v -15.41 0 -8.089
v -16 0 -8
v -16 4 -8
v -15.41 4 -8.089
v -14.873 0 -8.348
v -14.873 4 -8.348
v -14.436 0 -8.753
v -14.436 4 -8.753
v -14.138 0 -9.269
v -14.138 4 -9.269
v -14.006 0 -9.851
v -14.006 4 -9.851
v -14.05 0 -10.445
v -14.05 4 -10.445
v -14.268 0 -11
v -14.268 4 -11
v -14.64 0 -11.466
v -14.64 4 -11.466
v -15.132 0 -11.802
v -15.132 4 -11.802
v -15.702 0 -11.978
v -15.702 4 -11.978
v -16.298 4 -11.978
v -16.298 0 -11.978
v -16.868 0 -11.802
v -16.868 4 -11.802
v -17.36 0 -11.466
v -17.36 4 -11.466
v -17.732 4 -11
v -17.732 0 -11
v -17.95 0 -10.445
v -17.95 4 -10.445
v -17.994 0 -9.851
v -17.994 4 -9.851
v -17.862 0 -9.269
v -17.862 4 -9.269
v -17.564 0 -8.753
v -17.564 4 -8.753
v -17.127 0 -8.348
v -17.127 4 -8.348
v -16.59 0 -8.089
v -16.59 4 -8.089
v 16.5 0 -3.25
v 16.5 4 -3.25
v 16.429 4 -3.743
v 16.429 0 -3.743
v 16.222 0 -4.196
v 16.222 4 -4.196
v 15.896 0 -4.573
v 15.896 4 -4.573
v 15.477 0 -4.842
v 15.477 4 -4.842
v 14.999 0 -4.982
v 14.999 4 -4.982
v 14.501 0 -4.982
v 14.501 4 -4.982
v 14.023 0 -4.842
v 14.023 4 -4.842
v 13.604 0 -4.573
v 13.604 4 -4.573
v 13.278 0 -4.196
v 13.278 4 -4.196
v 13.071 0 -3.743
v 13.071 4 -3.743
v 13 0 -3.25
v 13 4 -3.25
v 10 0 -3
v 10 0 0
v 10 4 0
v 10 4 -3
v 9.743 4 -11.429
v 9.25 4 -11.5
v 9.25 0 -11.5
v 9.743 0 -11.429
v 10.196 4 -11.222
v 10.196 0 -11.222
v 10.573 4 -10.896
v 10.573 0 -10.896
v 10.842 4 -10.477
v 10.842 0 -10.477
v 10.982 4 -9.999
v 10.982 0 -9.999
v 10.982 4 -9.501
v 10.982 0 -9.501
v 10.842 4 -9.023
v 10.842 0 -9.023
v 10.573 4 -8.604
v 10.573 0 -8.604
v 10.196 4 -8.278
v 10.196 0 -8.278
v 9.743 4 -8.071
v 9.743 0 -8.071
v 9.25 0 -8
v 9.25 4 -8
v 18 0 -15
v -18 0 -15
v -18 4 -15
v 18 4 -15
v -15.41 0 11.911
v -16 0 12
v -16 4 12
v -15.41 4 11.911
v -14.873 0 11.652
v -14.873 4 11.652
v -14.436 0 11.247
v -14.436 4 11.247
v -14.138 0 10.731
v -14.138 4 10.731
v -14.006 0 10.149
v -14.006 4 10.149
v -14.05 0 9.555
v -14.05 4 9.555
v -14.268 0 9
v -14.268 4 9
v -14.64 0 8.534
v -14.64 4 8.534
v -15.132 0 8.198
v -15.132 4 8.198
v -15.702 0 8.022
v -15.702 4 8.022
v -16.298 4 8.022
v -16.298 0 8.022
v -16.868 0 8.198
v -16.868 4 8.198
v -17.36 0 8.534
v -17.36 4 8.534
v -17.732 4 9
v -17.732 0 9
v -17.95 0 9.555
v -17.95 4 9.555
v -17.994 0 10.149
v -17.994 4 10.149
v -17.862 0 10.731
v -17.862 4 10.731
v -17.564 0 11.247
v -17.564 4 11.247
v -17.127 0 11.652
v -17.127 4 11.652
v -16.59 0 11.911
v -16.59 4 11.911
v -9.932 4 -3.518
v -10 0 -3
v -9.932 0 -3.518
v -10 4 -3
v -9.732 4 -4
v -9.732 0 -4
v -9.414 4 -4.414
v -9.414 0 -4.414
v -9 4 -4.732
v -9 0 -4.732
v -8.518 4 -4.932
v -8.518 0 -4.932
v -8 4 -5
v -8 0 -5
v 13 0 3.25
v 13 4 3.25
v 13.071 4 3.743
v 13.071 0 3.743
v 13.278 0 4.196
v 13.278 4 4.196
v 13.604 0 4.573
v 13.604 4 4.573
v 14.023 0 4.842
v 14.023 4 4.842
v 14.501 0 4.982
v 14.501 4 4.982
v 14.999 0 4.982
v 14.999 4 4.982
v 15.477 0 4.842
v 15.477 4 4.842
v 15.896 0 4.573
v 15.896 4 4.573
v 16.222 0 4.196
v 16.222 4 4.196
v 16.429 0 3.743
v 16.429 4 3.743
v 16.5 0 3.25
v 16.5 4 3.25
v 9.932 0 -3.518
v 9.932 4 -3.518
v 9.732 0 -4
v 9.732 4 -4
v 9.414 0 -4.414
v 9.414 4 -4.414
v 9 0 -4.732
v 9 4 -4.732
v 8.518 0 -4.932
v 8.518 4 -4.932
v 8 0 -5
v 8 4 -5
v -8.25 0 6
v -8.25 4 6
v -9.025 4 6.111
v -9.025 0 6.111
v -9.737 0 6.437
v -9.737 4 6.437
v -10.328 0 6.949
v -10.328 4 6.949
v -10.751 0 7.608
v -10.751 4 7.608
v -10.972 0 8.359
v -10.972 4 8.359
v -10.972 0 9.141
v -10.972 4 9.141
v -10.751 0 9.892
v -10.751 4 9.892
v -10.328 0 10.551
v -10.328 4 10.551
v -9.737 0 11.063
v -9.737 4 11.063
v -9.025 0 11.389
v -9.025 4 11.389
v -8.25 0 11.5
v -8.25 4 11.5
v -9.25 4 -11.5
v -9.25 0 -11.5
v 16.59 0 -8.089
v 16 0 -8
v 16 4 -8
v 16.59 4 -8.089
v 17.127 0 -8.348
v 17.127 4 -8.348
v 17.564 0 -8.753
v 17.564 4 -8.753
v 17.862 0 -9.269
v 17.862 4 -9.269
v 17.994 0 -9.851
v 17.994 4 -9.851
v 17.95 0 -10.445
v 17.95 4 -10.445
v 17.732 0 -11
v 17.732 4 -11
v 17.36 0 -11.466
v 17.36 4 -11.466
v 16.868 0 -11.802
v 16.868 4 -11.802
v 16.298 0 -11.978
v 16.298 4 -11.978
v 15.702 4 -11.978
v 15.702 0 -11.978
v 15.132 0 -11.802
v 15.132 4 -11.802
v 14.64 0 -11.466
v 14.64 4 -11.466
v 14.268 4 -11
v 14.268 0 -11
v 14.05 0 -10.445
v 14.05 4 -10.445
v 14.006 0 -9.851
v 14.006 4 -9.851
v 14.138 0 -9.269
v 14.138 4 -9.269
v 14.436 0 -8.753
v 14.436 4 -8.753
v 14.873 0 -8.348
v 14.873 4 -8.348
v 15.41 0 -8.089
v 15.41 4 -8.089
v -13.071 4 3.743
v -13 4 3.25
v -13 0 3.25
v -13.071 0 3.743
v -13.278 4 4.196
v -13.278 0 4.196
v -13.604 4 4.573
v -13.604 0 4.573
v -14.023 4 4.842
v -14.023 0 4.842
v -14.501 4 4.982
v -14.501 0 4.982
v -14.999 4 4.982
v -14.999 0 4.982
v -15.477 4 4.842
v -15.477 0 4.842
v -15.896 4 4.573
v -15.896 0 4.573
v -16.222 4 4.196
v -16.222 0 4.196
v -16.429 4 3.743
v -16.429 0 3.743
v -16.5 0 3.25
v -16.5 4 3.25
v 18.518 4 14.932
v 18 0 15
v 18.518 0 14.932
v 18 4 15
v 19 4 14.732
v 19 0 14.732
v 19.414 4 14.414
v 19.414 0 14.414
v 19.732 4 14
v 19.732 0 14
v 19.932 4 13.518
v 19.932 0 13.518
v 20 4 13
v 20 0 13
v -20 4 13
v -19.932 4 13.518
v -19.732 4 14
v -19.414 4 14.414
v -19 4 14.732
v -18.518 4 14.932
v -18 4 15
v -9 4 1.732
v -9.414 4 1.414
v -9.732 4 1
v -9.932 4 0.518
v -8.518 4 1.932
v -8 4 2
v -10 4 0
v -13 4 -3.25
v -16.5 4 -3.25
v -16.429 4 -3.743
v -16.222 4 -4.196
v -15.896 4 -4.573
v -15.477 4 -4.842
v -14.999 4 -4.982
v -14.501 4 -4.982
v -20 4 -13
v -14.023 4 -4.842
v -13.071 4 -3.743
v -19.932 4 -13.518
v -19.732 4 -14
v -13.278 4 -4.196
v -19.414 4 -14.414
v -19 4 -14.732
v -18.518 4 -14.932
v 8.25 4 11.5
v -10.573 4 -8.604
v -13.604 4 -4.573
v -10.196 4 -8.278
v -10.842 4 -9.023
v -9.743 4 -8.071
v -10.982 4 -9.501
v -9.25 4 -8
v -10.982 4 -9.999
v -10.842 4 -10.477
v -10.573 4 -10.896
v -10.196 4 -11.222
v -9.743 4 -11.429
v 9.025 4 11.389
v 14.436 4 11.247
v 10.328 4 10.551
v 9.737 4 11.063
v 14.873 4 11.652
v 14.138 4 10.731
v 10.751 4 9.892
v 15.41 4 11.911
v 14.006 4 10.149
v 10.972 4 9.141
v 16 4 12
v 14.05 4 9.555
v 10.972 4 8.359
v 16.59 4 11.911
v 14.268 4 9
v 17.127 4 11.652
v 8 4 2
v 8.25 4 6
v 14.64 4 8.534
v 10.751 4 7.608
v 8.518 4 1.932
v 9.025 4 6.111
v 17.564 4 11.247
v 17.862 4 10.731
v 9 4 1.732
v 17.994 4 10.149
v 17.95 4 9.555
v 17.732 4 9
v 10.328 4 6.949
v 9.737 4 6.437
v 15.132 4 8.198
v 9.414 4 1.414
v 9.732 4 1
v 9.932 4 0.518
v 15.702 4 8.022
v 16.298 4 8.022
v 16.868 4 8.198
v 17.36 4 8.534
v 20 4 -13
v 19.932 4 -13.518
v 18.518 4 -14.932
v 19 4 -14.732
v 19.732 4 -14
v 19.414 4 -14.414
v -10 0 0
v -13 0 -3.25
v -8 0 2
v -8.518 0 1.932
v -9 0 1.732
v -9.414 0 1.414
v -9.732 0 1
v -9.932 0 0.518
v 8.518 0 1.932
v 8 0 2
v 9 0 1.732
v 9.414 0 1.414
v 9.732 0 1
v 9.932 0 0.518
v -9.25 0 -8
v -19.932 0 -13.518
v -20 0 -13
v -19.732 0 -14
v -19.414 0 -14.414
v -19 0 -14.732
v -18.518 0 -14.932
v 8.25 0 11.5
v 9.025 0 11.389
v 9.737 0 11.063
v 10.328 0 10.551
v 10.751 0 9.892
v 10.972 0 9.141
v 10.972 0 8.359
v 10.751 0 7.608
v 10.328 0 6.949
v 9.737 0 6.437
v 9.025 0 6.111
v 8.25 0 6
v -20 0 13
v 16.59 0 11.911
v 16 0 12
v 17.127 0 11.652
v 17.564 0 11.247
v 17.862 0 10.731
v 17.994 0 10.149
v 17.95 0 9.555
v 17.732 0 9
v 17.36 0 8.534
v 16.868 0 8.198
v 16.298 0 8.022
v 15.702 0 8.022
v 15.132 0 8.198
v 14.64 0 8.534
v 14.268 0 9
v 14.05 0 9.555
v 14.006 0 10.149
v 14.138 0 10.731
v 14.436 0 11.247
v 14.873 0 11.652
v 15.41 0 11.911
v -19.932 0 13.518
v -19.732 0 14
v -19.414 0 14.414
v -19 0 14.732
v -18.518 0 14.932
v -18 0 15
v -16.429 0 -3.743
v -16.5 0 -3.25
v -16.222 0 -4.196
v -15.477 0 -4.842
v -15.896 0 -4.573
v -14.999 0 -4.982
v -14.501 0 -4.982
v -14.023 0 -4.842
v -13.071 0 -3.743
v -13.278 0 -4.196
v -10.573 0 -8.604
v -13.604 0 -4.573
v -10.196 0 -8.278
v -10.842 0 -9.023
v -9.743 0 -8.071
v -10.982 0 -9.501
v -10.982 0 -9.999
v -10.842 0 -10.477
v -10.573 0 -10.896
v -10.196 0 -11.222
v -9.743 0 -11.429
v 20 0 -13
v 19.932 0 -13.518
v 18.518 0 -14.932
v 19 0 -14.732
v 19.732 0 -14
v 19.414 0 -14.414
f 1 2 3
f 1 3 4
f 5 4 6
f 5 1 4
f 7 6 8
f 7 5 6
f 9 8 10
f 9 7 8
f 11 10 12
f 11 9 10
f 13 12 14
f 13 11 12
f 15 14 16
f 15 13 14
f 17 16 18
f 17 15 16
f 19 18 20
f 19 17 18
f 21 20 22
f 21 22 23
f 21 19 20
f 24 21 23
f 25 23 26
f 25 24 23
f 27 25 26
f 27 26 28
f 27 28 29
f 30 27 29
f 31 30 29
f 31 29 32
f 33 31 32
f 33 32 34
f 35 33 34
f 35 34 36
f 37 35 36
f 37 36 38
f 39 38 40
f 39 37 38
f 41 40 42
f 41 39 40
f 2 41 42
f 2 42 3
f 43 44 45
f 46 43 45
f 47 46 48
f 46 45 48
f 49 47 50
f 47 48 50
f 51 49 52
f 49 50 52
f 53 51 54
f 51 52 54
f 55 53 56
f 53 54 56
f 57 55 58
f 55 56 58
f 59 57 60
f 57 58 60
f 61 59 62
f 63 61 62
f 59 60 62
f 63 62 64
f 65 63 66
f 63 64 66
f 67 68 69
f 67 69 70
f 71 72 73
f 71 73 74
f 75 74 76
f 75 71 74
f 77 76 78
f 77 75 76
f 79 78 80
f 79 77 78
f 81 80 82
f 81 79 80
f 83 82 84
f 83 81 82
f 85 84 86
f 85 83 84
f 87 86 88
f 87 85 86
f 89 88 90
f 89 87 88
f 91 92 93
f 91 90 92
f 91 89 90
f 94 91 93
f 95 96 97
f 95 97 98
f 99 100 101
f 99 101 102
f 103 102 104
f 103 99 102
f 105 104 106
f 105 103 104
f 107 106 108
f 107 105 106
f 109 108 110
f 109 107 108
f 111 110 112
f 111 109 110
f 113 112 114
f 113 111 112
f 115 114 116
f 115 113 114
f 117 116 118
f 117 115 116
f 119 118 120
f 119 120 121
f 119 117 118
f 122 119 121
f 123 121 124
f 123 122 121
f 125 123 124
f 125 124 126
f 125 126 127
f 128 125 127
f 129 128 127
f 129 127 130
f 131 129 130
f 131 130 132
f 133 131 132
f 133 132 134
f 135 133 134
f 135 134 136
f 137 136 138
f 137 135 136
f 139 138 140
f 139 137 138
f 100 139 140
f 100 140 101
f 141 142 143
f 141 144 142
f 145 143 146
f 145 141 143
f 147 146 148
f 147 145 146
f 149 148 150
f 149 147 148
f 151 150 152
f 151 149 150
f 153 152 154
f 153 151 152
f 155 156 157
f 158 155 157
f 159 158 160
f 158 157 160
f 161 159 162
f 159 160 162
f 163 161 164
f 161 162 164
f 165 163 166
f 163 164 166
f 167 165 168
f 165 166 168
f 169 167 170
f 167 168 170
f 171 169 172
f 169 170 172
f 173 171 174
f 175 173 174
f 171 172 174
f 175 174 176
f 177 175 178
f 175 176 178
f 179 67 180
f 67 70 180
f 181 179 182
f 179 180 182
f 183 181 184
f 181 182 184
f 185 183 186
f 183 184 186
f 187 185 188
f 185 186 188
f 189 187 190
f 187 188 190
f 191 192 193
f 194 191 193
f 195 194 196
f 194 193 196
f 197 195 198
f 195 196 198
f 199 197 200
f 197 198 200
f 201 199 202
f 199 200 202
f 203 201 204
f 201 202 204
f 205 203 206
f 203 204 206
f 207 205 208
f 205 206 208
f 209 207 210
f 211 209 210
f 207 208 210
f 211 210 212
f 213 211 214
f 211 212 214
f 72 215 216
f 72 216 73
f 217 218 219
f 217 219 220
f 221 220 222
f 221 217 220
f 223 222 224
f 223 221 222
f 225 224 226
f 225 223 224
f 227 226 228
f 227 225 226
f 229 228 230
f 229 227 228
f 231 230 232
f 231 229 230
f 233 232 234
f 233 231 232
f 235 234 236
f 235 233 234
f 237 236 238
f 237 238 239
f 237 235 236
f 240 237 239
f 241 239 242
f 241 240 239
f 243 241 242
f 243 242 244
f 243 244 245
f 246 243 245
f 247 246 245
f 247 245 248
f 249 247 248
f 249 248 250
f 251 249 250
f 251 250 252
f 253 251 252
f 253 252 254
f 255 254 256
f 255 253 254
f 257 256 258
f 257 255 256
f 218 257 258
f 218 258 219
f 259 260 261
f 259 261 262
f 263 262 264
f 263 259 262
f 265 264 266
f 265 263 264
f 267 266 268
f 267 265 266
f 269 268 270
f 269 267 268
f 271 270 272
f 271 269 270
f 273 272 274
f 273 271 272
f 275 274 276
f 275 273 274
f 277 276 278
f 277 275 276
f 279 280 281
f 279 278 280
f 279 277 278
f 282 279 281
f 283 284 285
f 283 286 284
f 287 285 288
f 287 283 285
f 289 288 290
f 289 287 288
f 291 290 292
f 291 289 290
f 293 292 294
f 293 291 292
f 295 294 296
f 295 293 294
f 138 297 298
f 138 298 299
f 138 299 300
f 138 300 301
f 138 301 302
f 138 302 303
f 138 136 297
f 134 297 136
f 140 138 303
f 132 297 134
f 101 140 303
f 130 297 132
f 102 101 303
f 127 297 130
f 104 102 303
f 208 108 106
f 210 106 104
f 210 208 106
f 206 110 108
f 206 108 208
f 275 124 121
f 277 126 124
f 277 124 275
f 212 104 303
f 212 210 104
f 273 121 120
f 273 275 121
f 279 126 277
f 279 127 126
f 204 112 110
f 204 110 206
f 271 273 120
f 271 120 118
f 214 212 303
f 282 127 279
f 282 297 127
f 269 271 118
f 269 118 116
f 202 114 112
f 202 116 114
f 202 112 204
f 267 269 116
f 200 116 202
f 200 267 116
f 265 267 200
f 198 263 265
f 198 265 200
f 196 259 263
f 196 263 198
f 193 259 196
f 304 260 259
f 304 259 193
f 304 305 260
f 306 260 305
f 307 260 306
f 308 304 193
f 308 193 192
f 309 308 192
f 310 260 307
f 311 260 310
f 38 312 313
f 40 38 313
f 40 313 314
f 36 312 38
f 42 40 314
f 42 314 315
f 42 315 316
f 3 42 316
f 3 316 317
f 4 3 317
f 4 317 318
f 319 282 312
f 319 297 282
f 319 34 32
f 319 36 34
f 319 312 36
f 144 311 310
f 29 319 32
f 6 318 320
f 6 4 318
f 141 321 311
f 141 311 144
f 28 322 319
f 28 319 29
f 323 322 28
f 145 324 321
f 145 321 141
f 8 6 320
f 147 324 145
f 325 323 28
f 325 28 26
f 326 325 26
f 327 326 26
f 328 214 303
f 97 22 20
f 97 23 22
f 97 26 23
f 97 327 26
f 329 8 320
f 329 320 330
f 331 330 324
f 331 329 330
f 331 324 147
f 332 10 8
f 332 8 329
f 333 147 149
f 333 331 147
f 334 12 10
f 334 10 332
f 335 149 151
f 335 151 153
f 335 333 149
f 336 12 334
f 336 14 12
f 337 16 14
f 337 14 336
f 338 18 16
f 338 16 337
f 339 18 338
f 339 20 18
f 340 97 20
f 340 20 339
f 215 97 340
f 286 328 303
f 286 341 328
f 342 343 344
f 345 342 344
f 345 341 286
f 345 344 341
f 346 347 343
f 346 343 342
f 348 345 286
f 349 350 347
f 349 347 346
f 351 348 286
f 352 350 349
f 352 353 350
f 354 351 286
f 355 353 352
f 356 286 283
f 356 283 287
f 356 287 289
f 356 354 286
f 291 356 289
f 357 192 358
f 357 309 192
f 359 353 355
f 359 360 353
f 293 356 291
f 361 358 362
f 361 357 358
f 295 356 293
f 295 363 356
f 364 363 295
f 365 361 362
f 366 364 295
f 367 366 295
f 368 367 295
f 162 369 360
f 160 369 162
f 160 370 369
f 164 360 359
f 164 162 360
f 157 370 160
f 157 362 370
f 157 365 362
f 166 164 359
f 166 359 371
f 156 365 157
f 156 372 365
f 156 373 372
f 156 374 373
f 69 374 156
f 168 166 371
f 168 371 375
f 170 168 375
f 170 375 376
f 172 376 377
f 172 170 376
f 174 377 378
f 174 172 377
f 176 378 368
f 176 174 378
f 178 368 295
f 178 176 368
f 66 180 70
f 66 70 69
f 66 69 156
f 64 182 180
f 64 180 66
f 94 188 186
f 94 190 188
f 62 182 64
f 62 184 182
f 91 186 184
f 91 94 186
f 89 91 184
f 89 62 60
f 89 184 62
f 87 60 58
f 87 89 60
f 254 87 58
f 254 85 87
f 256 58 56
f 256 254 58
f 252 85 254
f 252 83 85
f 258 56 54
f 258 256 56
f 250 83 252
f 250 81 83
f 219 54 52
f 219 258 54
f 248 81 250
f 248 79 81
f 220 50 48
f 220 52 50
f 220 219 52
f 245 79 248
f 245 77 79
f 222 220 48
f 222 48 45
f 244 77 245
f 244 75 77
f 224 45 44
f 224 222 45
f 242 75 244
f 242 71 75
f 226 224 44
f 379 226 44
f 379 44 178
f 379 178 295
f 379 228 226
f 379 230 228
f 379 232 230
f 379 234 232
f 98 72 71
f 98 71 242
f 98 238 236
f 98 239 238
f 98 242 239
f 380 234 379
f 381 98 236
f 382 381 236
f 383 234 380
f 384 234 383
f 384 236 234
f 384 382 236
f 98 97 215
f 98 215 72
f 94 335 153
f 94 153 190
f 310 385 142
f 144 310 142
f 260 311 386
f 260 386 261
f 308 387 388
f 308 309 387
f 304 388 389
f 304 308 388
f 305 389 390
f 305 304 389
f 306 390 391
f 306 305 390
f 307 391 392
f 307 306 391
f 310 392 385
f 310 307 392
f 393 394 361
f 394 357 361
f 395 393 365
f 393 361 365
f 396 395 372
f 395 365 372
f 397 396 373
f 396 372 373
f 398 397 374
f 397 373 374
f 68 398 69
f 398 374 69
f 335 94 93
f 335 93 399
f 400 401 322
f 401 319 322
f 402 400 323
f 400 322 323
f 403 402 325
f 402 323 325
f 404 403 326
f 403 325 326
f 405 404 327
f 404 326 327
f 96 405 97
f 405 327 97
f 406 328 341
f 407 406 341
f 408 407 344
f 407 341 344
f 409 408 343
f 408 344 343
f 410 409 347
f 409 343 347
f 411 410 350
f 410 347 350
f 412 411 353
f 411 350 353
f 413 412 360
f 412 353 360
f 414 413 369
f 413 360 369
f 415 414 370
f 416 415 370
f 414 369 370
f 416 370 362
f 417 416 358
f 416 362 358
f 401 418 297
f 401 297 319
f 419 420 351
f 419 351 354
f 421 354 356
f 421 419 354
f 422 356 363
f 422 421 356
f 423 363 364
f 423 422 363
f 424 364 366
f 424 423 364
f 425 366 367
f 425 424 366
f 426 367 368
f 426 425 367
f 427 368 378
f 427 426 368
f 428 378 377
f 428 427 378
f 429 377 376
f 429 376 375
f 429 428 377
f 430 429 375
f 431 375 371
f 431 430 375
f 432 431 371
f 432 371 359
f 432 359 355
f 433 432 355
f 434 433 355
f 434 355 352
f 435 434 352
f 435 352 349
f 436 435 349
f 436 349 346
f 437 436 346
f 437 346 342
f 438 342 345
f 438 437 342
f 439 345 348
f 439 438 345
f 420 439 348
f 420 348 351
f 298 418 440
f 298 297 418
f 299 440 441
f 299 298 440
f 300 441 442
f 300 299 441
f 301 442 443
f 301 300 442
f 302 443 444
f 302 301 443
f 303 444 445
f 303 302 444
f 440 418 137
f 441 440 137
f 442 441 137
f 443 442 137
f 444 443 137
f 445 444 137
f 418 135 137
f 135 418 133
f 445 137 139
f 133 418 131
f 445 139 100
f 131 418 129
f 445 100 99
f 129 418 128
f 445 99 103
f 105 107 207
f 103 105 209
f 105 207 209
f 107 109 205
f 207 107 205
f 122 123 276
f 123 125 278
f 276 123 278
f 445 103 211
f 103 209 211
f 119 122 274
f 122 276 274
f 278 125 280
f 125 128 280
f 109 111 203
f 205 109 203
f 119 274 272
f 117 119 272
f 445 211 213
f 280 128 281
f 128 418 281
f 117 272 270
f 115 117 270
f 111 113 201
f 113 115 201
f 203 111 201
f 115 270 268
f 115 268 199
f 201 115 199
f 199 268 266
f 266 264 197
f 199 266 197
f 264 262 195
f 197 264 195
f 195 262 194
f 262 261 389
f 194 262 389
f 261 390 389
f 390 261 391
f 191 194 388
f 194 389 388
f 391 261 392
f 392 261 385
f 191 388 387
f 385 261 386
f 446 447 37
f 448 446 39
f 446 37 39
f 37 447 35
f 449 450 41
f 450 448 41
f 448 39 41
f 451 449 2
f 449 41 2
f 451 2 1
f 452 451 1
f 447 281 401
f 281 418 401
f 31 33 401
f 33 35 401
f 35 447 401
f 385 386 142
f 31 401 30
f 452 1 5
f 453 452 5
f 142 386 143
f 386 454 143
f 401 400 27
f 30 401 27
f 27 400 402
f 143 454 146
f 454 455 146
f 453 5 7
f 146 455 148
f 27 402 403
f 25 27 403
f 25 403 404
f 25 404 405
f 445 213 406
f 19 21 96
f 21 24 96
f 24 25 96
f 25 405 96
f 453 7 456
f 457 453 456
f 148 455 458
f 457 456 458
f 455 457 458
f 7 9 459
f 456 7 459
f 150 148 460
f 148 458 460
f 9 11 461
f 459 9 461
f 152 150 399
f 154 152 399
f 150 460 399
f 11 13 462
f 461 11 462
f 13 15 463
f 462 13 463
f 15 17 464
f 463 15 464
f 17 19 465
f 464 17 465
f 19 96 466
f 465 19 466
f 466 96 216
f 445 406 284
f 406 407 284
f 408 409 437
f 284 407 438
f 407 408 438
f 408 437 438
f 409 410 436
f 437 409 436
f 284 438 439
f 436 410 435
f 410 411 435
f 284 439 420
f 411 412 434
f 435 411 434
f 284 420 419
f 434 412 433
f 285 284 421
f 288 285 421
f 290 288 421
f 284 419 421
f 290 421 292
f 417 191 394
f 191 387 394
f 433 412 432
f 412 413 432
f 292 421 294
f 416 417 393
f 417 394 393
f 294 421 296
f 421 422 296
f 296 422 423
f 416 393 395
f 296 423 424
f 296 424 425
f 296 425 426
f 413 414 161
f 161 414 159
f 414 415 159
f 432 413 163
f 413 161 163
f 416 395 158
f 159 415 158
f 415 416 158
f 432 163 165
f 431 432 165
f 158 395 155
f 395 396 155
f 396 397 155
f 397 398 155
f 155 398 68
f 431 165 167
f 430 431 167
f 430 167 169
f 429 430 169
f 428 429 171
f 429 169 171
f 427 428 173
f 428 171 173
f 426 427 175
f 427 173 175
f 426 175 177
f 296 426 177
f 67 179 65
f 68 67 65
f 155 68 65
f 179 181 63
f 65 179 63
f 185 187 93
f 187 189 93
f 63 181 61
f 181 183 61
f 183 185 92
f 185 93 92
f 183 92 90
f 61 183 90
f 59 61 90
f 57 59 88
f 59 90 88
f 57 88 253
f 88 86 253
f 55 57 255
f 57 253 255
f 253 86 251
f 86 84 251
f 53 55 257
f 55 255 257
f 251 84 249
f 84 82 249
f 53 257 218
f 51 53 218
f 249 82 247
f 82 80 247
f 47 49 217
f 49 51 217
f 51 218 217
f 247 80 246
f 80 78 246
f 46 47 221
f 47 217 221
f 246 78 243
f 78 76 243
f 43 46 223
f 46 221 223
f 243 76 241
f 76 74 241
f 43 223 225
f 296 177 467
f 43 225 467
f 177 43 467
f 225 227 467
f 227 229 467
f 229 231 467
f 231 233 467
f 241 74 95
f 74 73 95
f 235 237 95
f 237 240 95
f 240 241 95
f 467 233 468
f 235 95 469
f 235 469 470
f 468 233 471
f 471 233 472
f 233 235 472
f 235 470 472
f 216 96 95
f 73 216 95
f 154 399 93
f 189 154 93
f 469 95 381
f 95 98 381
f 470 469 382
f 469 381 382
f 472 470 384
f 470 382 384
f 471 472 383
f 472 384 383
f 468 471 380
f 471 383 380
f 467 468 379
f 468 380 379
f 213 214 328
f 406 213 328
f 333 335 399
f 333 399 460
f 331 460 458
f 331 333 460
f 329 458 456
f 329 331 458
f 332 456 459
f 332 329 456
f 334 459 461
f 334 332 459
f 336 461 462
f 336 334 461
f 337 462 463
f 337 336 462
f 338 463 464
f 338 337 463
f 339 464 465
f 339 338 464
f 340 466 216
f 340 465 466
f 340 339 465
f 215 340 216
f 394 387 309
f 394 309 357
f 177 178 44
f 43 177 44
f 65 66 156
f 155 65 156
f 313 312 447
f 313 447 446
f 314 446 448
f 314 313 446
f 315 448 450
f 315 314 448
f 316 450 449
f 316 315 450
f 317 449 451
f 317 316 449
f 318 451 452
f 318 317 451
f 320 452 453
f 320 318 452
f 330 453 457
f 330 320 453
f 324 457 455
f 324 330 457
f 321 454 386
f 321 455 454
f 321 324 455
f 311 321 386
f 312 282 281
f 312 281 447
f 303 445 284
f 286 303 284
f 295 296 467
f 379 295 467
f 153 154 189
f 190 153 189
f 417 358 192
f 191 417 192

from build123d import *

# Parameters (mm, degrees)
SKETCH_1_W          = 40
SKETCH_1_H          = 30
SKETCH_1_R          = 2
SKETCH_1_W_2        = 20
SKETCH_1_H_2        = 7
EXTRUDE_1_DEPTH     = 4
CUT_EXTRUDE_1_DEPTH = 26.317977802
FILLET_1_R          = 2


with BuildPart() as part:
    # 草图1 → 凸台-拉伸1 (new body)
    with BuildSketch(Plane(origin=(0, 0, 0), x_dir=(1, 0, 0), z_dir=(0, 1, 0))):
        Rectangle(SKETCH_1_W, SKETCH_1_H)
        with Locations(Location((-16, 10, 0), (0, 0, 270))):
            Circle(SKETCH_1_R, mode=Mode.SUBTRACT)
        with Locations(Location((-16, -10, 0), (0, 0, 270))):
            Circle(SKETCH_1_R, mode=Mode.SUBTRACT)
        with Locations(Location((16, 10, 0), (0, 0, 270))):
            Circle(SKETCH_1_R, mode=Mode.SUBTRACT)
        with Locations(Location((16, -10, 0), (0, 0, 270))):
            Circle(SKETCH_1_R, mode=Mode.SUBTRACT)
        with Locations((0, 1.5)):
            Rectangle(SKETCH_1_W_2, SKETCH_1_H_2, mode=Mode.SUBTRACT)
    extrude(amount=EXTRUDE_1_DEPTH)

    # 草图2 → 切除-拉伸1 (cut, through all)
    with BuildSketch(Plane(origin=(0, 4, 0), x_dir=(1, 0, 0), z_dir=(0, 1, 0))):
        with BuildLine():
            Line((-9.25, 11.5), (9.25, 11.5))
            ThreePointArc((9.25, 11.5), (11, 9.75), (9.25, 8))
            Line((9.25, 8), (-9.25, 8))
            ThreePointArc((-9.25, 8), (-11, 9.75), (-9.25, 11.5))
        make_face()
        with BuildLine():
            Line((-13, 3.25), (-13, -3.25))
            ThreePointArc((-13, -3.25), (-14.75, -5), (-16.5, -3.25))
            Line((-16.5, -3.25), (-16.5, 3.25))
            ThreePointArc((-16.5, 3.25), (-14.75, 5), (-13, 3.25))
        make_face()
        with BuildLine():
            Line((13, 3.25), (13, -3.25))
            ThreePointArc((13, -3.25), (14.75, -5), (16.5, -3.25))
            Line((16.5, -3.25), (16.5, 3.25))
            ThreePointArc((16.5, 3.25), (14.75, 5), (13, 3.25))
        make_face()
        with BuildLine():
            Line((-8.25, -11.5), (8.25, -11.5))
            ThreePointArc((8.25, -11.5), (11, -8.75), (8.25, -6))
            Line((8.25, -6), (-8.25, -6))
            ThreePointArc((-8.25, -6), (-11, -8.75), (-8.25, -11.5))
        make_face()
    extrude(amount=-CUT_EXTRUDE_1_DEPTH, mode=Mode.SUBTRACT)

    # 圆角1
    fillet_1_edges = [part.edges().sort_by_distance(p)[0] for p in [
        (-10, 2, -5),
        (-10, 2, 2),
        (10, 2, 2),
        (10, 2, -5),
        (-20, 2, -15),
        (20, 2, -15),
        (20, 2, 15),
        (-20, 2, 15),
    ]]
    fillet(fillet_1_edges, radius=FILLET_1_R)


solid = part.part
